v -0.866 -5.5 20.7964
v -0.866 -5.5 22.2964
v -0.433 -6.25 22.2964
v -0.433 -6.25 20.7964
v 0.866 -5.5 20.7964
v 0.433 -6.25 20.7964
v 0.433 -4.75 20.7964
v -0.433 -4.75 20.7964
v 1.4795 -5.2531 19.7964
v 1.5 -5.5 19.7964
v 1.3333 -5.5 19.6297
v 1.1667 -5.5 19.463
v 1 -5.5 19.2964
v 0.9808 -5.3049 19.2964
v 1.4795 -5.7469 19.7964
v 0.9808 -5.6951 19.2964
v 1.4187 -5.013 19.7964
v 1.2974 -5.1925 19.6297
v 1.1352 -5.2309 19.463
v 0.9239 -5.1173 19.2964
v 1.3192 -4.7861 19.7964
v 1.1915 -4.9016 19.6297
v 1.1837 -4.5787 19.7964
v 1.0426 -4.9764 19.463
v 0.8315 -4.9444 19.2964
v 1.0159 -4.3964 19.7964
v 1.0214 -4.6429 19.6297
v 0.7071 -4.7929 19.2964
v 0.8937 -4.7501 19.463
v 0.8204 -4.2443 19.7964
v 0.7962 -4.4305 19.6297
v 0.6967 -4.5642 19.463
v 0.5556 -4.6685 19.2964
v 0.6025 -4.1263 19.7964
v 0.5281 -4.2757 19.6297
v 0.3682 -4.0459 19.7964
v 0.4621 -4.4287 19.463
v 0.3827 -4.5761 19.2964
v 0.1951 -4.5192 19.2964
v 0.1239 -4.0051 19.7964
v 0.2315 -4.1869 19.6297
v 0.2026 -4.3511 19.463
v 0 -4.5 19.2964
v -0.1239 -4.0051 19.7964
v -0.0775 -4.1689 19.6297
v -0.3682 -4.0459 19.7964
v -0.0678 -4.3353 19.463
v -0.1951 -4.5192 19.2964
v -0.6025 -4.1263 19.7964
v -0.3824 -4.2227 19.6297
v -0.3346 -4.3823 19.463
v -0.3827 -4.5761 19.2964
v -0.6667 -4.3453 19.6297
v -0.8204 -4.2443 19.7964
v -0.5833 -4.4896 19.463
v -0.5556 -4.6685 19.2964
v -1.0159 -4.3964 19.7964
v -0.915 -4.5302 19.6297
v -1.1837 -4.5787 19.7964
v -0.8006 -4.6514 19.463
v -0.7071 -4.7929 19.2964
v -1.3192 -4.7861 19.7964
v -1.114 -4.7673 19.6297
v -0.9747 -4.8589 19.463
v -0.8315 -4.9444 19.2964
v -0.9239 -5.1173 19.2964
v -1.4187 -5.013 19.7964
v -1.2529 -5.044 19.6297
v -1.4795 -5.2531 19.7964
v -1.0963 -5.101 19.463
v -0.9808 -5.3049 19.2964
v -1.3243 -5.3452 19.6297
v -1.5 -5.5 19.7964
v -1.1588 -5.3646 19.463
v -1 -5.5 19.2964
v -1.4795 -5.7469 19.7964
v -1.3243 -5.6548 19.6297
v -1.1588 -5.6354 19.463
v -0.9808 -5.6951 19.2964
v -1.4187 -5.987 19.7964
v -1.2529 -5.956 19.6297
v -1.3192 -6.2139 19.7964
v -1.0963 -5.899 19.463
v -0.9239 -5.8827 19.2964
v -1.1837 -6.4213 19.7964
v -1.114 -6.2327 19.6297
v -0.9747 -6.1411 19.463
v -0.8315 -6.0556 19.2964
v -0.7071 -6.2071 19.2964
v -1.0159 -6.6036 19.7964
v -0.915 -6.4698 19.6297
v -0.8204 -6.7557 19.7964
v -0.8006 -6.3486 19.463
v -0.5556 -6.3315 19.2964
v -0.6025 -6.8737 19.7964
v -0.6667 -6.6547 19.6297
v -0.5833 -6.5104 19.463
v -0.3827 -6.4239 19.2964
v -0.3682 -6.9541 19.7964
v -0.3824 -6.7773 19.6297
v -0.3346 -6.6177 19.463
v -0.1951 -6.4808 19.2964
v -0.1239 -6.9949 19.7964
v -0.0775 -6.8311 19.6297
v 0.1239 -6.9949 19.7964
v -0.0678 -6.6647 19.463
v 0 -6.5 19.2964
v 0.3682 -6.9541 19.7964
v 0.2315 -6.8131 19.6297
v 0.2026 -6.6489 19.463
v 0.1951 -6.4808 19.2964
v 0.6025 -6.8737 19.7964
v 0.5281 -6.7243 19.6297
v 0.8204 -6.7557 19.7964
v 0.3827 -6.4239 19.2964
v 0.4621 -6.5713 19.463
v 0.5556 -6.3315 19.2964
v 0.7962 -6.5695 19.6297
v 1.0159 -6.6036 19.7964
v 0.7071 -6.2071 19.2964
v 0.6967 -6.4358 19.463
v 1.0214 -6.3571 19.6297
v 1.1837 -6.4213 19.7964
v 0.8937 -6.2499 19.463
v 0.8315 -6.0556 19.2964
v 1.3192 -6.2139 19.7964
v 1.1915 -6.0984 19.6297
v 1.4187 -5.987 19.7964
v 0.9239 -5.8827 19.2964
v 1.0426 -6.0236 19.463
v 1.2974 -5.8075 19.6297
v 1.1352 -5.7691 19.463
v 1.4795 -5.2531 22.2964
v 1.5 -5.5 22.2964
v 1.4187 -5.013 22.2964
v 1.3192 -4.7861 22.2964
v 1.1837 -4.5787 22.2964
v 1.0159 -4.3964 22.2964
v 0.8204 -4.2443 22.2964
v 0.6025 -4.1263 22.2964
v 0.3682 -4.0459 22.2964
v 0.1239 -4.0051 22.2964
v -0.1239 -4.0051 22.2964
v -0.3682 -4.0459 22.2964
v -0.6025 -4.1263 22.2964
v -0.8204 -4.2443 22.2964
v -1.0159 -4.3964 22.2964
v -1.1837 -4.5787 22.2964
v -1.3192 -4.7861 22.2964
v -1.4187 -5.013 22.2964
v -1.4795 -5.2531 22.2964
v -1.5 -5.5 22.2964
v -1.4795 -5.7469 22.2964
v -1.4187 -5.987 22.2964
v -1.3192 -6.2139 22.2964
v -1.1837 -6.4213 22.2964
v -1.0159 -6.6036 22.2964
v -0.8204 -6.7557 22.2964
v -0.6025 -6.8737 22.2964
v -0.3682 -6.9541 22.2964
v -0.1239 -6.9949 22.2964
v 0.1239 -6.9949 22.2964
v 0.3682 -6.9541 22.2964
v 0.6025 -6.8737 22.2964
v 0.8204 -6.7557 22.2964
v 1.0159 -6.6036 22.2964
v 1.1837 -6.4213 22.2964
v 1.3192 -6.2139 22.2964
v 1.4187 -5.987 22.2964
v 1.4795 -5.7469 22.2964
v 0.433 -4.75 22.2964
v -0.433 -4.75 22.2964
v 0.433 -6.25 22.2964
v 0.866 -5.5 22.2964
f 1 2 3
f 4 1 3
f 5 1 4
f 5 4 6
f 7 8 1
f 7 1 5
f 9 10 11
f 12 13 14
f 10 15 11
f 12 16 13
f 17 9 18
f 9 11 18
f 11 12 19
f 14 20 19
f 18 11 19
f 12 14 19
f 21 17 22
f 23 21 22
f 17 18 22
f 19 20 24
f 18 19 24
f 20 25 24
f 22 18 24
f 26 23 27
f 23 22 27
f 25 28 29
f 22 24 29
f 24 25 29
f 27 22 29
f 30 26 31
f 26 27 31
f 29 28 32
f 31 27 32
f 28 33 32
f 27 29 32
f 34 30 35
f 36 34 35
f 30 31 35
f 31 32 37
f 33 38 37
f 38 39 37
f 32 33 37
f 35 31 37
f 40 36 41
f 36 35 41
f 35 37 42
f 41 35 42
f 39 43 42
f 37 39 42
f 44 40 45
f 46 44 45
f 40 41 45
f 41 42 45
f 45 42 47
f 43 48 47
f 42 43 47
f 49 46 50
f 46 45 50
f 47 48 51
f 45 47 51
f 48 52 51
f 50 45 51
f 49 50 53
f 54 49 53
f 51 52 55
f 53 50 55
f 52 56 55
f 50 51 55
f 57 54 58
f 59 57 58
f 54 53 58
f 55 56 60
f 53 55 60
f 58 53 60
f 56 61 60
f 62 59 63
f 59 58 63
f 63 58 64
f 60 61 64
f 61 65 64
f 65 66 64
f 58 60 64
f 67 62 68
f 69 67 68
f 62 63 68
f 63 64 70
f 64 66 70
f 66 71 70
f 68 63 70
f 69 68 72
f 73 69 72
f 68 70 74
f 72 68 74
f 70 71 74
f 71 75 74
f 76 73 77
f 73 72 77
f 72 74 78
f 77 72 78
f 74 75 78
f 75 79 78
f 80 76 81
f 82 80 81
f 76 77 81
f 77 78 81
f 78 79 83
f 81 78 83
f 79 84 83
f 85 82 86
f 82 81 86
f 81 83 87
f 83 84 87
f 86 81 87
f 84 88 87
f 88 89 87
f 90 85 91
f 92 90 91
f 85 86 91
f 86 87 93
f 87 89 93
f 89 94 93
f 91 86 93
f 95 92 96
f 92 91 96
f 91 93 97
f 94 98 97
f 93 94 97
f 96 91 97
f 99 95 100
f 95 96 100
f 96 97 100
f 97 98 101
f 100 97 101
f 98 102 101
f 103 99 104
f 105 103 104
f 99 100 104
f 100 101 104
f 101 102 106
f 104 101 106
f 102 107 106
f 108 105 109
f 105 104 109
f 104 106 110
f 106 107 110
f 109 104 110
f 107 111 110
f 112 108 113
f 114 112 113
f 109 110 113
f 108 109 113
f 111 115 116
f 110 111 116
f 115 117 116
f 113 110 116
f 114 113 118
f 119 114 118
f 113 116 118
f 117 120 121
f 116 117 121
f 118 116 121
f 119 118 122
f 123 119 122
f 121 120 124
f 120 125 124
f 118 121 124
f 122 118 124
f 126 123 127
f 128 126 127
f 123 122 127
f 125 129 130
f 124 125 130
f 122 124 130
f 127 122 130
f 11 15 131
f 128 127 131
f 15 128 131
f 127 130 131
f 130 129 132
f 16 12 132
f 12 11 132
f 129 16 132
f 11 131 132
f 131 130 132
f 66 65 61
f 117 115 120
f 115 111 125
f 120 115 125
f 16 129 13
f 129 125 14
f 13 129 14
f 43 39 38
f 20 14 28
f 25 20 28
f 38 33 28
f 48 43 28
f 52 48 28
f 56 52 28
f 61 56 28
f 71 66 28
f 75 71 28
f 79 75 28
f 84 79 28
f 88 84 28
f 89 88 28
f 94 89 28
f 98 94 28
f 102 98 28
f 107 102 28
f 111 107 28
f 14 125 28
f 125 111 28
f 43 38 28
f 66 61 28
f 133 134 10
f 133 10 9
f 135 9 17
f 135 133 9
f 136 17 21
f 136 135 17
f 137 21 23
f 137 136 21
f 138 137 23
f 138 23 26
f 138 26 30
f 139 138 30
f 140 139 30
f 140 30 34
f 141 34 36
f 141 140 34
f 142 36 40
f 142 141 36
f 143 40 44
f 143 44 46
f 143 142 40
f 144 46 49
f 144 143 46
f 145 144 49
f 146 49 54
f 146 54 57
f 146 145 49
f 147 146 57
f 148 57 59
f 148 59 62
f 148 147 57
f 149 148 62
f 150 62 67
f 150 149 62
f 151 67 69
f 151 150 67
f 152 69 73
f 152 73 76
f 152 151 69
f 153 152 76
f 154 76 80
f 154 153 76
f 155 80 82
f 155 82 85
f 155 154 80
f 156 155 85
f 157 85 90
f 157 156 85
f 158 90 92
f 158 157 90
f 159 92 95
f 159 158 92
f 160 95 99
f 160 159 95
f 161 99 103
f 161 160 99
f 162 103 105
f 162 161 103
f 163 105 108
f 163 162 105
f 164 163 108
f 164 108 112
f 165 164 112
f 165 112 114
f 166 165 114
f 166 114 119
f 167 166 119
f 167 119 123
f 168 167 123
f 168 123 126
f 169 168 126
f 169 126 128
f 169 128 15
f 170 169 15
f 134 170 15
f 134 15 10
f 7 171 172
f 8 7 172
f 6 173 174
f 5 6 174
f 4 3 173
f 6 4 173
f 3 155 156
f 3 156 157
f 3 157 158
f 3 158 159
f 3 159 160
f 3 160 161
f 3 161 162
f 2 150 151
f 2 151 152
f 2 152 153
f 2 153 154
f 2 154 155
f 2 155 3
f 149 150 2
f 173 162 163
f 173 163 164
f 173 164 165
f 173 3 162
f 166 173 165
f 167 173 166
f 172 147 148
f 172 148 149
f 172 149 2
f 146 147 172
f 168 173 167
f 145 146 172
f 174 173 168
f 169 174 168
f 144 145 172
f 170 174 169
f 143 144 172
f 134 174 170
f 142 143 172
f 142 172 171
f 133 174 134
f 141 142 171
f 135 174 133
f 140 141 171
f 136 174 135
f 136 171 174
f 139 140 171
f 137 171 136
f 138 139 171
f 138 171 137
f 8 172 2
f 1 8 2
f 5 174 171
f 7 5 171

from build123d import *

# Parameters (mm, degrees)
SKETCH016_W     = 1.5
SKETCH016_H     = 3
CHAMFER001_SIZE = 0.5
POCKET010_DEPTH = 1.5


with BuildPart() as part:
    # Sketch016 (on Face1 of Binder001) → Revolution001 (revolve)
    with BuildSketch(Plane(origin=(0, -5.5, 0), x_dir=(-1, 0, 0), z_dir=(0, 1, 0))):
        with Locations((-0.75, 20.796372)):
            Rectangle(SKETCH016_W, SKETCH016_H)
    revolve(axis=Axis((0, -5.5, 0), (0, 0, 1)))

    # Chamfer001
    chamfer001_edges = [part.edges().sort_by_distance(p)[0] for p in [
        (-1.5, -5.5, 19.296372),
    ]]
    chamfer(chamfer001_edges, length=CHAMFER001_SIZE)

    # Sketch017 (on Face4 of Chamfer001) → Pocket010 (cut)
    with BuildSketch(Plane.XY.offset(22.296372)):
        Polygon((-0.433013, -4.75), (-0.866025, -5.5), (-0.433013, -6.25), (0.433013, -6.25), (0.866025, -5.5), (0.433013, -4.75), align=None)
    extrude(amount=-POCKET010_DEPTH, mode=Mode.SUBTRACT)


solid = part.part
